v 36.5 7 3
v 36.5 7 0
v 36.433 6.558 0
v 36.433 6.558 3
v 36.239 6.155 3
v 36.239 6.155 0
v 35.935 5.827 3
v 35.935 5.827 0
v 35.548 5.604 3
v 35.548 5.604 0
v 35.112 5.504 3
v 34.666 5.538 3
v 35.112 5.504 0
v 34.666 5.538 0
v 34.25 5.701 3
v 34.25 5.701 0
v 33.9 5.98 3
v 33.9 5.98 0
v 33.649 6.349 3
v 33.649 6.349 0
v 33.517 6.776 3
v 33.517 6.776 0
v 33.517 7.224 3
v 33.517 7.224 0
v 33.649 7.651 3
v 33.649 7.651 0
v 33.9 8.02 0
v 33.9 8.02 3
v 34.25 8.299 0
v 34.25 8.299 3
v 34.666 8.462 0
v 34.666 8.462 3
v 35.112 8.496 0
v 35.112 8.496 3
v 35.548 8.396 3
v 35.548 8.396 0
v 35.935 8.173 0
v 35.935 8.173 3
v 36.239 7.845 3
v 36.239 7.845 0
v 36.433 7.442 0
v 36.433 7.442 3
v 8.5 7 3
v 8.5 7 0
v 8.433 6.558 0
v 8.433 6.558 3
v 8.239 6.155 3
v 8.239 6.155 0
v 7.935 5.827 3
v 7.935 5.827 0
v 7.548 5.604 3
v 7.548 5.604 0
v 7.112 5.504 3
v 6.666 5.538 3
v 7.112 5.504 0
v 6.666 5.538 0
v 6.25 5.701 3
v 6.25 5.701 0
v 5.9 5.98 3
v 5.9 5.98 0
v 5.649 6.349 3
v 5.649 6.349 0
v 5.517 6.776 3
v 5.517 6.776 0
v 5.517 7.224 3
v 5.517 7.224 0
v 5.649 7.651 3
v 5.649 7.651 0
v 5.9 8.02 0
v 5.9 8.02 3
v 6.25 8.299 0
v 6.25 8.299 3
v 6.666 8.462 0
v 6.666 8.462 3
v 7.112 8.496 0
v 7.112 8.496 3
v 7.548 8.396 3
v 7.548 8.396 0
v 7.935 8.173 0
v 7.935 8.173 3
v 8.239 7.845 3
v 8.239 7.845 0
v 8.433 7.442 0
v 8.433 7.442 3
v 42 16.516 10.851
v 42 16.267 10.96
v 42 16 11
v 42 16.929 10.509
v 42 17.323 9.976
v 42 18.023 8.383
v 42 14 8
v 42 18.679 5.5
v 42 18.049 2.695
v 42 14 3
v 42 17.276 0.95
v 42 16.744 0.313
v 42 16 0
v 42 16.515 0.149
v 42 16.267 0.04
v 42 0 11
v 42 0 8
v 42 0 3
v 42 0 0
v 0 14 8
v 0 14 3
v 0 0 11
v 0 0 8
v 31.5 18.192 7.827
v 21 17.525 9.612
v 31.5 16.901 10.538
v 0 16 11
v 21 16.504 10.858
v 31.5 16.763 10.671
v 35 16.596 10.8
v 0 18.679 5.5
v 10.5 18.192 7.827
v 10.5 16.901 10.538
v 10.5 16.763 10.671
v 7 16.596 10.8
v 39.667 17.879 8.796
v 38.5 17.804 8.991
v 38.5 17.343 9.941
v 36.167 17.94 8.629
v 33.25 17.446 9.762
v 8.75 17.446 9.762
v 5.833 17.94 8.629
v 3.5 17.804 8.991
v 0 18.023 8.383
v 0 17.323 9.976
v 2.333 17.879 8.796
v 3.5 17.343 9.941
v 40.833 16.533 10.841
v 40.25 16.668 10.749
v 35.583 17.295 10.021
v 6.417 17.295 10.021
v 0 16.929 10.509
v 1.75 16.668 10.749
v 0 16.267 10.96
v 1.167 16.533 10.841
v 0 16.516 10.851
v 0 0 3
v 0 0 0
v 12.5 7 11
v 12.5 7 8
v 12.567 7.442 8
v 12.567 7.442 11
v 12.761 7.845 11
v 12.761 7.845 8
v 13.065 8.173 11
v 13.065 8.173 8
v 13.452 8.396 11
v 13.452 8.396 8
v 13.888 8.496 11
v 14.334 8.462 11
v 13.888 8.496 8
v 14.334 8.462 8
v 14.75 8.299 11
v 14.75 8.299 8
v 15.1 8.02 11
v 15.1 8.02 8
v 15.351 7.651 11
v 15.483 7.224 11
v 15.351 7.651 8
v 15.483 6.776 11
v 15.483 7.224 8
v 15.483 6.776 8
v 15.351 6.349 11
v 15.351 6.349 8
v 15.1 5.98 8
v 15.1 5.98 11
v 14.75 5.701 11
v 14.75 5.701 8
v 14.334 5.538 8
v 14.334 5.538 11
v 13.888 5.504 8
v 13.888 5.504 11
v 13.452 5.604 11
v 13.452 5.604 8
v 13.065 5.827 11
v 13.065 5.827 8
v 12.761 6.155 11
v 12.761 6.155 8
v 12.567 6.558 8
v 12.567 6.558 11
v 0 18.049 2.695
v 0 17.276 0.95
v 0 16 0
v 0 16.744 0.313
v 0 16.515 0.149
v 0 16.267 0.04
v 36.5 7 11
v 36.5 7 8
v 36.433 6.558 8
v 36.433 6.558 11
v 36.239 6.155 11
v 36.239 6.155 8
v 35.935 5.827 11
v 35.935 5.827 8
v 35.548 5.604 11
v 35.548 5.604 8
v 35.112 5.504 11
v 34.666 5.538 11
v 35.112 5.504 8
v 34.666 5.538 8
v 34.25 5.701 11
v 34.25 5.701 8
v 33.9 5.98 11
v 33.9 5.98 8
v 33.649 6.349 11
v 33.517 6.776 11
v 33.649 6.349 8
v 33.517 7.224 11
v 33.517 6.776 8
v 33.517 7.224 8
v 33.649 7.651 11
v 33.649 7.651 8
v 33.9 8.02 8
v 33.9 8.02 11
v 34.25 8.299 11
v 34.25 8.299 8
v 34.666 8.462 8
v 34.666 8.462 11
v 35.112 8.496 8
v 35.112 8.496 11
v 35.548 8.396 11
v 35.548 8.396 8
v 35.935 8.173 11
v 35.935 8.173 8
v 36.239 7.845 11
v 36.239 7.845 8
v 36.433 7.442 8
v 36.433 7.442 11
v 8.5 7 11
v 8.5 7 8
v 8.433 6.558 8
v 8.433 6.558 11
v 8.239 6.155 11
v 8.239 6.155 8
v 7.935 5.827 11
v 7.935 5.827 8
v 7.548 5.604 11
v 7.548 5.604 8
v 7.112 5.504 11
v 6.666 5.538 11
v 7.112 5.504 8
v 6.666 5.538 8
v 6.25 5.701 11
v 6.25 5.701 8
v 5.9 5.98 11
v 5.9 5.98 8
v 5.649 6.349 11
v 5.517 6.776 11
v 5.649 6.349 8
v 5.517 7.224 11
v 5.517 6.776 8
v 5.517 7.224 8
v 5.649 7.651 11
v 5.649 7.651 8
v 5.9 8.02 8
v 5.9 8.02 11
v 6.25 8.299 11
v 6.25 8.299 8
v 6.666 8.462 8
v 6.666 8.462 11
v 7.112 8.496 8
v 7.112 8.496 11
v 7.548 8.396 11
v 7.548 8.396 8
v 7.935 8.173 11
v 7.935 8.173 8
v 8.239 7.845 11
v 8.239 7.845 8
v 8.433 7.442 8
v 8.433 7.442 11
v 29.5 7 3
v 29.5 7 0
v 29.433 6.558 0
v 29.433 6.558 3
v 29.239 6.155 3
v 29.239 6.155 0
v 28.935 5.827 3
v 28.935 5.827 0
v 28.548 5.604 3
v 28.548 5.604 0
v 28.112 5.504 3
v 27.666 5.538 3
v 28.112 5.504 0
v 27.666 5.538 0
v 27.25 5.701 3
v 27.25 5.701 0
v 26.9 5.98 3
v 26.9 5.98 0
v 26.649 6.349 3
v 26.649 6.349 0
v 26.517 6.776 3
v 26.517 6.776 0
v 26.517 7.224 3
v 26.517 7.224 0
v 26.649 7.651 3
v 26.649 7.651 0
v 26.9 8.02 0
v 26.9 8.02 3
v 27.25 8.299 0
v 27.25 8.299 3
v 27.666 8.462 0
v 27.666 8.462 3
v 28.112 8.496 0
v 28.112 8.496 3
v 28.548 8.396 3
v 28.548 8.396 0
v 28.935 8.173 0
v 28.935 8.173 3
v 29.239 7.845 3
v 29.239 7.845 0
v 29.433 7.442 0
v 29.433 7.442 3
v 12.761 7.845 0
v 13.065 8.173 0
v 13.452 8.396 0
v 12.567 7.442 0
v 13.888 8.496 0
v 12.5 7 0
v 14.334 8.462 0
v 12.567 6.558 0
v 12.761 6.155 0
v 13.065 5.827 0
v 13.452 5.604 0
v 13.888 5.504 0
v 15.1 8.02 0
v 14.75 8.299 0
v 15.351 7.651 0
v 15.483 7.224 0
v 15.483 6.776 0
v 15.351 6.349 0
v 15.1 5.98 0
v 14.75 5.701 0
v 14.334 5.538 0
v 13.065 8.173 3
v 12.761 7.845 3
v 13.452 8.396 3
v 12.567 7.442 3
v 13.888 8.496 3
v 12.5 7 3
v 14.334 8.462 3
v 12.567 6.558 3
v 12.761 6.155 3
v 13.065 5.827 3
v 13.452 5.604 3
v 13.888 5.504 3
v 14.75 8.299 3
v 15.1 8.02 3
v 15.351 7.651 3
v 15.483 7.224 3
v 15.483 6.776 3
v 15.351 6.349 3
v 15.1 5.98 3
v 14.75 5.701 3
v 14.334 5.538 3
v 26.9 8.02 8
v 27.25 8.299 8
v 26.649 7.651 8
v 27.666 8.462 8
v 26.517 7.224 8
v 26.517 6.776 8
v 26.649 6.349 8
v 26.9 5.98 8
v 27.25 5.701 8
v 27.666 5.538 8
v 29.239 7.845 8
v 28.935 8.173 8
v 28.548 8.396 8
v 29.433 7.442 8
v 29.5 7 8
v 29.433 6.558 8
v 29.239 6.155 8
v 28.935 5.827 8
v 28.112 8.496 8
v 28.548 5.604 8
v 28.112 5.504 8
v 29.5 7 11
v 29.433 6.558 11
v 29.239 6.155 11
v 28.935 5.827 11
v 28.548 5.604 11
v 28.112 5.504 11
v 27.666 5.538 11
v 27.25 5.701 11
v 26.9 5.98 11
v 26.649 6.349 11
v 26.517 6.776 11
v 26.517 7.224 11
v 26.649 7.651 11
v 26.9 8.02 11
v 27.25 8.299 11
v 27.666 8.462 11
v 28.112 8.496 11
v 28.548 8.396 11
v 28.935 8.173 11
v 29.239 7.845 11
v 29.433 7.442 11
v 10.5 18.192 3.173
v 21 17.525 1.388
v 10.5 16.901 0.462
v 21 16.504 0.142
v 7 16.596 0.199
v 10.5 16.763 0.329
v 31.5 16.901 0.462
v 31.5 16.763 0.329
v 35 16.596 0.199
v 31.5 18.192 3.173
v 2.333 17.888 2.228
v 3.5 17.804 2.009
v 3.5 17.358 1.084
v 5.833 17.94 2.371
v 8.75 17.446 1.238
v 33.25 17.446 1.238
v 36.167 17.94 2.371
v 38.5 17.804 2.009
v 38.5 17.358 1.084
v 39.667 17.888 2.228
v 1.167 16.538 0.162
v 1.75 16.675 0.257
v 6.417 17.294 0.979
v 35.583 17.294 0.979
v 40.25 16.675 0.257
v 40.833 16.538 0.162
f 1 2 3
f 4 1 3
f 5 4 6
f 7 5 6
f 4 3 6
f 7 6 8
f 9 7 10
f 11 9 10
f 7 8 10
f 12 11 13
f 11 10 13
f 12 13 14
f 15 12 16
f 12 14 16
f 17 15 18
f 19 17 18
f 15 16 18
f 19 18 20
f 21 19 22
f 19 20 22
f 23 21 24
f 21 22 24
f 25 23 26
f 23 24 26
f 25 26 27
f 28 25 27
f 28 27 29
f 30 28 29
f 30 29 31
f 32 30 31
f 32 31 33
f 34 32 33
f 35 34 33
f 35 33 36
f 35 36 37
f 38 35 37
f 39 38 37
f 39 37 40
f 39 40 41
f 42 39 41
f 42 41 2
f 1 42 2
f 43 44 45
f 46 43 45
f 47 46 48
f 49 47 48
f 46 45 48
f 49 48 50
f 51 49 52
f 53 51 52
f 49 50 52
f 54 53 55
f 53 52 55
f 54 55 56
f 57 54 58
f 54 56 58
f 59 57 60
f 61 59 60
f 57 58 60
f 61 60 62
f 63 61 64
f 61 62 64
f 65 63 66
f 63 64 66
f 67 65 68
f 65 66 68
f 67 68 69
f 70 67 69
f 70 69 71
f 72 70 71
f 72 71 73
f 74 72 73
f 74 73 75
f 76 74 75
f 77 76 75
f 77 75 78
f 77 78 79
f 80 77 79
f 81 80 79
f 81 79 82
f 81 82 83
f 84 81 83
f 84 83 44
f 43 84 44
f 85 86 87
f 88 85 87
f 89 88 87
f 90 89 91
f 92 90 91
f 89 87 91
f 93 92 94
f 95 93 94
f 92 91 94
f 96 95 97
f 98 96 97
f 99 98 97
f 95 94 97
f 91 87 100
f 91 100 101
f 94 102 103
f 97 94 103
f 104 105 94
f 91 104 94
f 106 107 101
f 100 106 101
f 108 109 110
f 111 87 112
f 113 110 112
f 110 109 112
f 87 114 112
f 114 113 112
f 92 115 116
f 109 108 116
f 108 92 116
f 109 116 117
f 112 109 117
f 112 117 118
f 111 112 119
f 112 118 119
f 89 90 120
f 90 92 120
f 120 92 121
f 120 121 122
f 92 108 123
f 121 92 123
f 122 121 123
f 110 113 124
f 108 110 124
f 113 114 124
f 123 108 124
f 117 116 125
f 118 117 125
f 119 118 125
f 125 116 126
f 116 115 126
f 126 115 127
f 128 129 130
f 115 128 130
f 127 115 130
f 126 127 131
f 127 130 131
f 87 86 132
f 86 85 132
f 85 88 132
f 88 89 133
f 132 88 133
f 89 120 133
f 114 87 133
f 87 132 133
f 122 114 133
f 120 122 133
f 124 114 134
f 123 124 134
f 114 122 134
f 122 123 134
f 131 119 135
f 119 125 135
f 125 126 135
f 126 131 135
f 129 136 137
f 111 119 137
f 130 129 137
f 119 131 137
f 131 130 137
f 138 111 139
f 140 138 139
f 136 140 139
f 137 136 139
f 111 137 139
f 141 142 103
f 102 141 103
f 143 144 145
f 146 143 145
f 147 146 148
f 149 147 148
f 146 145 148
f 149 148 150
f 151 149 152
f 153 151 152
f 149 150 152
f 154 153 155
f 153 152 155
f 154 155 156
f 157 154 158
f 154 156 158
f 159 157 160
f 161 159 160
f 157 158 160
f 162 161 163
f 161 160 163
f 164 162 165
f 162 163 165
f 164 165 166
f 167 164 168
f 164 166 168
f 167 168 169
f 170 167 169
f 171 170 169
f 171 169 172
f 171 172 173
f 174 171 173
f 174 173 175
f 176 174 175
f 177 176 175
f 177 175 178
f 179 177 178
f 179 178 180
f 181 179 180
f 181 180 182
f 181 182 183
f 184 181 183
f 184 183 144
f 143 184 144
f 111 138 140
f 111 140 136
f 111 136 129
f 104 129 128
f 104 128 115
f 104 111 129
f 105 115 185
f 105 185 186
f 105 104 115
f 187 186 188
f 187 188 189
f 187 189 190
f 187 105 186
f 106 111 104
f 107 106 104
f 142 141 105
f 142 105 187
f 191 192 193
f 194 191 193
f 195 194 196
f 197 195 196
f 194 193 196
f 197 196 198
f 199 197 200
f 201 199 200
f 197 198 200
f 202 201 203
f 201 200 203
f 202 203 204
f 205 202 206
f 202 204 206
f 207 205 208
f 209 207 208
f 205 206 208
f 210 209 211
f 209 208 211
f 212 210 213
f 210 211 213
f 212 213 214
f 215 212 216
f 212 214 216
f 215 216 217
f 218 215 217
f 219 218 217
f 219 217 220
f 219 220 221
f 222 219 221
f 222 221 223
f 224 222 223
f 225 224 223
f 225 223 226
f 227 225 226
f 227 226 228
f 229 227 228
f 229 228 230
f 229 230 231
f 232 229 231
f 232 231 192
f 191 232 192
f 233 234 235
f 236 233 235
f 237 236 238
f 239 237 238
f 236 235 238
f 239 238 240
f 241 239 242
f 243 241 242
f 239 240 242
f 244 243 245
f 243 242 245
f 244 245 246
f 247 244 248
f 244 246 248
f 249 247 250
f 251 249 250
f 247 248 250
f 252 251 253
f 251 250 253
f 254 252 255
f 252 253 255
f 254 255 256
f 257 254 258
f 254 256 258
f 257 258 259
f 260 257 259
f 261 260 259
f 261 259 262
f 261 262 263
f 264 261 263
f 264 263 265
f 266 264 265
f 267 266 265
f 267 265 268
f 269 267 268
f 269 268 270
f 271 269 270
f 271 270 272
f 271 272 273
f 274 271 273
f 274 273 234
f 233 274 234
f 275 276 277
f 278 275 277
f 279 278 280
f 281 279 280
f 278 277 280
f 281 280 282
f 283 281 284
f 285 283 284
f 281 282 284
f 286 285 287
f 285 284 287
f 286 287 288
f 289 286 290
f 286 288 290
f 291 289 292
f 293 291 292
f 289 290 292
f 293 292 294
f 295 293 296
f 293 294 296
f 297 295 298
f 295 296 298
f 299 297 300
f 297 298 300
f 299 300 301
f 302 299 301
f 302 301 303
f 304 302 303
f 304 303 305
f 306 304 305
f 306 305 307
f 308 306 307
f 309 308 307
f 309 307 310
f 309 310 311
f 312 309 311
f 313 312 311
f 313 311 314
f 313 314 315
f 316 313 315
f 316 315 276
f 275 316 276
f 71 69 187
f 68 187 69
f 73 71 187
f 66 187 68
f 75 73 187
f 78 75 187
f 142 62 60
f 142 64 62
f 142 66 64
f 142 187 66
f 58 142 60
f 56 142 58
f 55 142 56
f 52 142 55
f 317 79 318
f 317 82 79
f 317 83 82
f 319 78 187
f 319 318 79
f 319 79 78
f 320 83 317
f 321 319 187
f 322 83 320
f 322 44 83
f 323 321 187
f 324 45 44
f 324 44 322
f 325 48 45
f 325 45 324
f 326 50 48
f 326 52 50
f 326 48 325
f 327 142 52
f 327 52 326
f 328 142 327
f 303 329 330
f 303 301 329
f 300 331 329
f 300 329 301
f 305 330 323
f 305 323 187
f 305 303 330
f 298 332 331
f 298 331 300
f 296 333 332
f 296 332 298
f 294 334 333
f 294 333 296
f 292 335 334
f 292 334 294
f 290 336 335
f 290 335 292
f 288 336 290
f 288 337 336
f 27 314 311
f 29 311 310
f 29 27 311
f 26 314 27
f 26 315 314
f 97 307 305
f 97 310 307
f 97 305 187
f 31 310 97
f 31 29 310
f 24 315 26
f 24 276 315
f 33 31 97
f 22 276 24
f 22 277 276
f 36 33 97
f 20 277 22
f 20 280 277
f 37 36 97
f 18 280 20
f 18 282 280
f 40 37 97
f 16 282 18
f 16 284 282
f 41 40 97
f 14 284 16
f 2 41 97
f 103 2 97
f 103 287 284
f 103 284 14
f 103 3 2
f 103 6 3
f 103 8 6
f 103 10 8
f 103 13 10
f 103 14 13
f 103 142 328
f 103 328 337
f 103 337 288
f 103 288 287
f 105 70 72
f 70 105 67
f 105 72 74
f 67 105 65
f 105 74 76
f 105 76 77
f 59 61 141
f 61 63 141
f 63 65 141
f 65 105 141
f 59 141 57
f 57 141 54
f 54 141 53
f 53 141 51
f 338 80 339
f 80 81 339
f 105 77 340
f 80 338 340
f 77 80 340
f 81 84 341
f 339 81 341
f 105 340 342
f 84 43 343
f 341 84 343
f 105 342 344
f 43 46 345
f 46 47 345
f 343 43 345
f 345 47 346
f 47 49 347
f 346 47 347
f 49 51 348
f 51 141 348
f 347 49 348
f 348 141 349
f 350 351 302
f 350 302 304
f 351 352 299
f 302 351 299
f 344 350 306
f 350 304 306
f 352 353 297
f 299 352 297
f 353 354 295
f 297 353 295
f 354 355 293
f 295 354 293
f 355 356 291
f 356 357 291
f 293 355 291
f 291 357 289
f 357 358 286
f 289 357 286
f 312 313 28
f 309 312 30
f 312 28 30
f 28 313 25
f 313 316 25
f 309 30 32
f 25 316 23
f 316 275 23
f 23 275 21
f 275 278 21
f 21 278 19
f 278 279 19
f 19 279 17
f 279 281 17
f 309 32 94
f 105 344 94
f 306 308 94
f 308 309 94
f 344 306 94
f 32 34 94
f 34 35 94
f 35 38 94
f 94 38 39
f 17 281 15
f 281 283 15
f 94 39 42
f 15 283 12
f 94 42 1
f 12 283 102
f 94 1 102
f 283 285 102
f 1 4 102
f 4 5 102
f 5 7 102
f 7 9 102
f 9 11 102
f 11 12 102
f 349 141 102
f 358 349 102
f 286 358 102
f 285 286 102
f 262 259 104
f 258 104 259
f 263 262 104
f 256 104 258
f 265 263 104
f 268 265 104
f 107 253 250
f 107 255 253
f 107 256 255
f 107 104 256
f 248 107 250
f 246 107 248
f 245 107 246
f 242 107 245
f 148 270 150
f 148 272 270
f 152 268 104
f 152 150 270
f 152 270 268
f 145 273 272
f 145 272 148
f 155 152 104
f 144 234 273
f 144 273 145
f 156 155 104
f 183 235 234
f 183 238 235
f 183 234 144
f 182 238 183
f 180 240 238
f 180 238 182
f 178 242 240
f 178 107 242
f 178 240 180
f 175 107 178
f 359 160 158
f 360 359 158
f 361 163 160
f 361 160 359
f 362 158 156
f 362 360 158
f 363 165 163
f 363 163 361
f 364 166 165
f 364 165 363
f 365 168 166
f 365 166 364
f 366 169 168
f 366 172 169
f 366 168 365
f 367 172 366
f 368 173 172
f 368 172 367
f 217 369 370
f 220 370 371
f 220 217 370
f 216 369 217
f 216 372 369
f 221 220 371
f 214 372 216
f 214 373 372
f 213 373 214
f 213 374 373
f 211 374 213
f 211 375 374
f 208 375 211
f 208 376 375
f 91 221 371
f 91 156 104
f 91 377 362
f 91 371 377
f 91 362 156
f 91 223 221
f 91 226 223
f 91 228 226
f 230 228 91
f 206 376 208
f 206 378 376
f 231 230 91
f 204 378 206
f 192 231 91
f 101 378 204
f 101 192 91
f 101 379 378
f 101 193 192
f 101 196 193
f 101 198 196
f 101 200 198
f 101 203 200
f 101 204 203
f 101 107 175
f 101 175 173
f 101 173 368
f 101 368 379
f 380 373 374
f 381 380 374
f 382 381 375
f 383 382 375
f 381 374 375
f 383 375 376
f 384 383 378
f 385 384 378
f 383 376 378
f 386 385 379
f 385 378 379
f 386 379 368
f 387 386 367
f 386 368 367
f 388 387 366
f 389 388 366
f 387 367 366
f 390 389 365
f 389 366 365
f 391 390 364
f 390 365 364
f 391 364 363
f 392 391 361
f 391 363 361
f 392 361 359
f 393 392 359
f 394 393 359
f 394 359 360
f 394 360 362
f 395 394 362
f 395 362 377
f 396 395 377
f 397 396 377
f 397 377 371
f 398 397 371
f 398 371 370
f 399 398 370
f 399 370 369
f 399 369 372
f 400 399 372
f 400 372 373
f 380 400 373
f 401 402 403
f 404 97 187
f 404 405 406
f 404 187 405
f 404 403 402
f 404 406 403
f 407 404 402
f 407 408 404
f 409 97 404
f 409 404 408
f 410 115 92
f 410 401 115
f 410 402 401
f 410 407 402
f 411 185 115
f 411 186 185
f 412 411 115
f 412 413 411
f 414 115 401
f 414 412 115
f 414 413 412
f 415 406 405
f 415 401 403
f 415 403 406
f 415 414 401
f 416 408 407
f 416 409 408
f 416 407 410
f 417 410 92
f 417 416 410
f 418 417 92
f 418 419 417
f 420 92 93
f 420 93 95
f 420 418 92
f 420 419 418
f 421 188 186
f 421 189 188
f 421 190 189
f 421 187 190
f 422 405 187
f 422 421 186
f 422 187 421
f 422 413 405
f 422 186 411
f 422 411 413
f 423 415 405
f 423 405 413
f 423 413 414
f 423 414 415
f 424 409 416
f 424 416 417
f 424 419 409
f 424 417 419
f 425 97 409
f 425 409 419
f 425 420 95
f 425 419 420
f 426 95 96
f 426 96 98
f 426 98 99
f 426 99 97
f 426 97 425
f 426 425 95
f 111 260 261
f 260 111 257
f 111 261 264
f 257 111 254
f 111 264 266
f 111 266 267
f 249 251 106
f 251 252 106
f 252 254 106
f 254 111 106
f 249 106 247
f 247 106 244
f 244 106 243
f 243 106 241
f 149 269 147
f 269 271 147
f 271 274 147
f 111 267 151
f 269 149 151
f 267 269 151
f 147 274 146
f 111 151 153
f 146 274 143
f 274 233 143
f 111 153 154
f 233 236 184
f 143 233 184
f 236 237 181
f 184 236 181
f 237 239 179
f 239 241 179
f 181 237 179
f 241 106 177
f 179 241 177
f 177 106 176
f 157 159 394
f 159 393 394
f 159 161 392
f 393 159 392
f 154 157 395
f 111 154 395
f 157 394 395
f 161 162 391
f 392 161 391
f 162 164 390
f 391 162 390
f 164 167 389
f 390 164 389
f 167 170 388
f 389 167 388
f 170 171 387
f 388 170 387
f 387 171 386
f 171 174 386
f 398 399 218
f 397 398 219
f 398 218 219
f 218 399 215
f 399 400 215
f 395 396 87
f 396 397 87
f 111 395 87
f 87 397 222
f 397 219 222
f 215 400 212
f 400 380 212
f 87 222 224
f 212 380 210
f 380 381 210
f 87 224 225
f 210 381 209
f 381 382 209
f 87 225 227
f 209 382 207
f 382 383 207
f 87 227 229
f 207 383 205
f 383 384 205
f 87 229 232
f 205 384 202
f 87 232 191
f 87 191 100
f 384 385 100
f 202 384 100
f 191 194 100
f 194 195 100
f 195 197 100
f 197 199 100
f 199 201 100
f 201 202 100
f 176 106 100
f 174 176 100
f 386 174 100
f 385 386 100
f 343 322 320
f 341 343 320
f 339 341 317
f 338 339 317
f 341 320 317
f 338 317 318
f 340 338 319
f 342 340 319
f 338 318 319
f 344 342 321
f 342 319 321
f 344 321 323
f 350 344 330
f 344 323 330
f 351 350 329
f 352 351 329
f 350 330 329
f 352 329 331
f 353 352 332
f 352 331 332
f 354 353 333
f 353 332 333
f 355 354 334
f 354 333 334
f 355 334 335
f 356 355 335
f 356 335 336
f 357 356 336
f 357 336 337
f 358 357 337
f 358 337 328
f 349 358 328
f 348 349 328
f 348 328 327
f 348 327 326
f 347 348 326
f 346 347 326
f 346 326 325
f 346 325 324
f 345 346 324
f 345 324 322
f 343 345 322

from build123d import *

# Parameters (mm, degrees)
SKETCH1_W             = 42
SKETCH1_H             = 3
BOSS_EXTRUDE1_DEPTH   = 14
BOSS_EXTRUDE1_2_DEPTH = 14
SKETCH2_R             = 1.5
CUT_EXTRUDE1_DEPTH    = 14
SKETCH3_W             = 42
SKETCH3_H             = 11
BOSS_EXTRUDE2_DEPTH   = 5
FILLET1_SIZE          = 3
FILLET1_SIZE_2        = 10


with BuildPart() as part:
    # Sketch1 → Boss-Extrude1 (new body)
    with BuildSketch(Plane(origin=(0, 0, 0), x_dir=(1, 0, 0), z_dir=(0, 1, 0))):
        with Locations((21, -1.5)):
            Rectangle(SKETCH1_W, SKETCH1_H)
    extrude(amount=BOSS_EXTRUDE1_DEPTH)


with BuildPart() as body_2:
    # Sketch1 → Boss-Extrude1 2 (new body)
    with BuildSketch(Plane(origin=(0, 0, 0), x_dir=(1, 0, 0), z_dir=(0, 1, 0))):
        with Locations((21, -9.5)):
            Rectangle(SKETCH1_W, SKETCH1_H)
    extrude(amount=BOSS_EXTRUDE1_2_DEPTH)


with BuildPart() as cut_extrude1_tool:
    # Sketch2 → Cut-Extrude1 (new body)
    with BuildSketch(Plane(origin=(0, 0, 0), x_dir=(-1, 0, 0), z_dir=(0, 0, -1))):
        with BuildLine():
            Line((-36.5, 7), (-35, 7))
            Line((-35, 7), (-33.5, 7))
            ThreePointArc((-33.5, 7), (-35, 8.5), (-36.5, 7))
        make_face()
        with BuildLine():
            Line((-33.5, 7), (-35, 7))
            Line((-35, 7), (-36.5, 7))
            ThreePointArc((-36.5, 7), (-35, 5.5), (-33.5, 7))
        make_face()
        with BuildLine():
            ThreePointArc((-26.5, 7), (-28, 8.5), (-29.5, 7))
            Line((-29.5, 7), (-28, 7))
            Line((-28, 7), (-26.5, 7))
        make_face()
        with BuildLine():
            Line((-28, 7), (-29.5, 7))
            ThreePointArc((-29.5, 7), (-28, 5.5), (-26.5, 7))
            Line((-26.5, 7), (-28, 7))
        make_face()
        with BuildLine():
            ThreePointArc((-5.5, 7), (-7, 8.5), (-8.5, 7))
            Line((-8.5, 7), (-7, 7))
            Line((-7, 7), (-5.5, 7))
        make_face()
        with BuildLine():
            Line((-7, 7), (-8.5, 7))
            ThreePointArc((-8.5, 7), (-7, 5.5), (-5.5, 7))
            Line((-5.5, 7), (-7, 7))
        make_face()
        with Locations((-14, 7)):
            Circle(SKETCH2_R)
    extrude(amount=-CUT_EXTRUDE1_DEPTH)


with BuildPart() as part_1:
    add(part.part)

    # Cut-Extrude1: cut by cut_extrude1_tool
    add(cut_extrude1_tool.part, mode=Mode.SUBTRACT)



with BuildPart() as body_2_1:
    add(body_2.part)

    # Cut-Extrude1: cut by cut_extrude1_tool
    add(cut_extrude1_tool.part, mode=Mode.SUBTRACT)


with BuildPart() as part_2:
    add(part_1.part)

    add(body_2_1.part)  # Boss-Extrude2 merges body 2
    # Sketch3 → Boss-Extrude2 (add)
    with BuildSketch(Plane(origin=(0, 14, 0), x_dir=(1, 0, 0), z_dir=(0, 1, 0))):
        with Locations((21, -5.5)):
            Rectangle(SKETCH3_W, SKETCH3_H)
    extrude(amount=BOSS_EXTRUDE2_DEPTH)

    # Fillet1
    # an asymmetric fillet: 10, 3 mm, written as the material it takes off along each edge
    with BuildSketch(Plane(origin=(67, 19, 0), x_dir=(0, -1, 0), z_dir=(-1, 0, 0))) as fillet1_piece_1:
        with BuildLine():
            Bezier((FILLET1_SIZE, 0), (0, 0), (0, FILLET1_SIZE_2), weights=[1, 0.707106781, 1])
            Line((0, FILLET1_SIZE_2), (0, 0))
            Line((0, 0), (FILLET1_SIZE, 0))
        make_face()
    extrude(amount=92, mode=Mode.SUBTRACT)
    with BuildSketch(Plane(origin=(-25, 19, 11), x_dir=(0, 0, -1), z_dir=(1, 0, 0))) as fillet1_piece_2:
        with BuildLine():
            Bezier((FILLET1_SIZE_2, 0), (0, 0), (0, -FILLET1_SIZE), weights=[1, 0.707106781, 1])
            Line((0, -FILLET1_SIZE), (0, 0))
            Line((0, 0), (FILLET1_SIZE_2, 0))
        make_face()
    extrude(amount=92, mode=Mode.SUBTRACT)


solid = part_2.part
